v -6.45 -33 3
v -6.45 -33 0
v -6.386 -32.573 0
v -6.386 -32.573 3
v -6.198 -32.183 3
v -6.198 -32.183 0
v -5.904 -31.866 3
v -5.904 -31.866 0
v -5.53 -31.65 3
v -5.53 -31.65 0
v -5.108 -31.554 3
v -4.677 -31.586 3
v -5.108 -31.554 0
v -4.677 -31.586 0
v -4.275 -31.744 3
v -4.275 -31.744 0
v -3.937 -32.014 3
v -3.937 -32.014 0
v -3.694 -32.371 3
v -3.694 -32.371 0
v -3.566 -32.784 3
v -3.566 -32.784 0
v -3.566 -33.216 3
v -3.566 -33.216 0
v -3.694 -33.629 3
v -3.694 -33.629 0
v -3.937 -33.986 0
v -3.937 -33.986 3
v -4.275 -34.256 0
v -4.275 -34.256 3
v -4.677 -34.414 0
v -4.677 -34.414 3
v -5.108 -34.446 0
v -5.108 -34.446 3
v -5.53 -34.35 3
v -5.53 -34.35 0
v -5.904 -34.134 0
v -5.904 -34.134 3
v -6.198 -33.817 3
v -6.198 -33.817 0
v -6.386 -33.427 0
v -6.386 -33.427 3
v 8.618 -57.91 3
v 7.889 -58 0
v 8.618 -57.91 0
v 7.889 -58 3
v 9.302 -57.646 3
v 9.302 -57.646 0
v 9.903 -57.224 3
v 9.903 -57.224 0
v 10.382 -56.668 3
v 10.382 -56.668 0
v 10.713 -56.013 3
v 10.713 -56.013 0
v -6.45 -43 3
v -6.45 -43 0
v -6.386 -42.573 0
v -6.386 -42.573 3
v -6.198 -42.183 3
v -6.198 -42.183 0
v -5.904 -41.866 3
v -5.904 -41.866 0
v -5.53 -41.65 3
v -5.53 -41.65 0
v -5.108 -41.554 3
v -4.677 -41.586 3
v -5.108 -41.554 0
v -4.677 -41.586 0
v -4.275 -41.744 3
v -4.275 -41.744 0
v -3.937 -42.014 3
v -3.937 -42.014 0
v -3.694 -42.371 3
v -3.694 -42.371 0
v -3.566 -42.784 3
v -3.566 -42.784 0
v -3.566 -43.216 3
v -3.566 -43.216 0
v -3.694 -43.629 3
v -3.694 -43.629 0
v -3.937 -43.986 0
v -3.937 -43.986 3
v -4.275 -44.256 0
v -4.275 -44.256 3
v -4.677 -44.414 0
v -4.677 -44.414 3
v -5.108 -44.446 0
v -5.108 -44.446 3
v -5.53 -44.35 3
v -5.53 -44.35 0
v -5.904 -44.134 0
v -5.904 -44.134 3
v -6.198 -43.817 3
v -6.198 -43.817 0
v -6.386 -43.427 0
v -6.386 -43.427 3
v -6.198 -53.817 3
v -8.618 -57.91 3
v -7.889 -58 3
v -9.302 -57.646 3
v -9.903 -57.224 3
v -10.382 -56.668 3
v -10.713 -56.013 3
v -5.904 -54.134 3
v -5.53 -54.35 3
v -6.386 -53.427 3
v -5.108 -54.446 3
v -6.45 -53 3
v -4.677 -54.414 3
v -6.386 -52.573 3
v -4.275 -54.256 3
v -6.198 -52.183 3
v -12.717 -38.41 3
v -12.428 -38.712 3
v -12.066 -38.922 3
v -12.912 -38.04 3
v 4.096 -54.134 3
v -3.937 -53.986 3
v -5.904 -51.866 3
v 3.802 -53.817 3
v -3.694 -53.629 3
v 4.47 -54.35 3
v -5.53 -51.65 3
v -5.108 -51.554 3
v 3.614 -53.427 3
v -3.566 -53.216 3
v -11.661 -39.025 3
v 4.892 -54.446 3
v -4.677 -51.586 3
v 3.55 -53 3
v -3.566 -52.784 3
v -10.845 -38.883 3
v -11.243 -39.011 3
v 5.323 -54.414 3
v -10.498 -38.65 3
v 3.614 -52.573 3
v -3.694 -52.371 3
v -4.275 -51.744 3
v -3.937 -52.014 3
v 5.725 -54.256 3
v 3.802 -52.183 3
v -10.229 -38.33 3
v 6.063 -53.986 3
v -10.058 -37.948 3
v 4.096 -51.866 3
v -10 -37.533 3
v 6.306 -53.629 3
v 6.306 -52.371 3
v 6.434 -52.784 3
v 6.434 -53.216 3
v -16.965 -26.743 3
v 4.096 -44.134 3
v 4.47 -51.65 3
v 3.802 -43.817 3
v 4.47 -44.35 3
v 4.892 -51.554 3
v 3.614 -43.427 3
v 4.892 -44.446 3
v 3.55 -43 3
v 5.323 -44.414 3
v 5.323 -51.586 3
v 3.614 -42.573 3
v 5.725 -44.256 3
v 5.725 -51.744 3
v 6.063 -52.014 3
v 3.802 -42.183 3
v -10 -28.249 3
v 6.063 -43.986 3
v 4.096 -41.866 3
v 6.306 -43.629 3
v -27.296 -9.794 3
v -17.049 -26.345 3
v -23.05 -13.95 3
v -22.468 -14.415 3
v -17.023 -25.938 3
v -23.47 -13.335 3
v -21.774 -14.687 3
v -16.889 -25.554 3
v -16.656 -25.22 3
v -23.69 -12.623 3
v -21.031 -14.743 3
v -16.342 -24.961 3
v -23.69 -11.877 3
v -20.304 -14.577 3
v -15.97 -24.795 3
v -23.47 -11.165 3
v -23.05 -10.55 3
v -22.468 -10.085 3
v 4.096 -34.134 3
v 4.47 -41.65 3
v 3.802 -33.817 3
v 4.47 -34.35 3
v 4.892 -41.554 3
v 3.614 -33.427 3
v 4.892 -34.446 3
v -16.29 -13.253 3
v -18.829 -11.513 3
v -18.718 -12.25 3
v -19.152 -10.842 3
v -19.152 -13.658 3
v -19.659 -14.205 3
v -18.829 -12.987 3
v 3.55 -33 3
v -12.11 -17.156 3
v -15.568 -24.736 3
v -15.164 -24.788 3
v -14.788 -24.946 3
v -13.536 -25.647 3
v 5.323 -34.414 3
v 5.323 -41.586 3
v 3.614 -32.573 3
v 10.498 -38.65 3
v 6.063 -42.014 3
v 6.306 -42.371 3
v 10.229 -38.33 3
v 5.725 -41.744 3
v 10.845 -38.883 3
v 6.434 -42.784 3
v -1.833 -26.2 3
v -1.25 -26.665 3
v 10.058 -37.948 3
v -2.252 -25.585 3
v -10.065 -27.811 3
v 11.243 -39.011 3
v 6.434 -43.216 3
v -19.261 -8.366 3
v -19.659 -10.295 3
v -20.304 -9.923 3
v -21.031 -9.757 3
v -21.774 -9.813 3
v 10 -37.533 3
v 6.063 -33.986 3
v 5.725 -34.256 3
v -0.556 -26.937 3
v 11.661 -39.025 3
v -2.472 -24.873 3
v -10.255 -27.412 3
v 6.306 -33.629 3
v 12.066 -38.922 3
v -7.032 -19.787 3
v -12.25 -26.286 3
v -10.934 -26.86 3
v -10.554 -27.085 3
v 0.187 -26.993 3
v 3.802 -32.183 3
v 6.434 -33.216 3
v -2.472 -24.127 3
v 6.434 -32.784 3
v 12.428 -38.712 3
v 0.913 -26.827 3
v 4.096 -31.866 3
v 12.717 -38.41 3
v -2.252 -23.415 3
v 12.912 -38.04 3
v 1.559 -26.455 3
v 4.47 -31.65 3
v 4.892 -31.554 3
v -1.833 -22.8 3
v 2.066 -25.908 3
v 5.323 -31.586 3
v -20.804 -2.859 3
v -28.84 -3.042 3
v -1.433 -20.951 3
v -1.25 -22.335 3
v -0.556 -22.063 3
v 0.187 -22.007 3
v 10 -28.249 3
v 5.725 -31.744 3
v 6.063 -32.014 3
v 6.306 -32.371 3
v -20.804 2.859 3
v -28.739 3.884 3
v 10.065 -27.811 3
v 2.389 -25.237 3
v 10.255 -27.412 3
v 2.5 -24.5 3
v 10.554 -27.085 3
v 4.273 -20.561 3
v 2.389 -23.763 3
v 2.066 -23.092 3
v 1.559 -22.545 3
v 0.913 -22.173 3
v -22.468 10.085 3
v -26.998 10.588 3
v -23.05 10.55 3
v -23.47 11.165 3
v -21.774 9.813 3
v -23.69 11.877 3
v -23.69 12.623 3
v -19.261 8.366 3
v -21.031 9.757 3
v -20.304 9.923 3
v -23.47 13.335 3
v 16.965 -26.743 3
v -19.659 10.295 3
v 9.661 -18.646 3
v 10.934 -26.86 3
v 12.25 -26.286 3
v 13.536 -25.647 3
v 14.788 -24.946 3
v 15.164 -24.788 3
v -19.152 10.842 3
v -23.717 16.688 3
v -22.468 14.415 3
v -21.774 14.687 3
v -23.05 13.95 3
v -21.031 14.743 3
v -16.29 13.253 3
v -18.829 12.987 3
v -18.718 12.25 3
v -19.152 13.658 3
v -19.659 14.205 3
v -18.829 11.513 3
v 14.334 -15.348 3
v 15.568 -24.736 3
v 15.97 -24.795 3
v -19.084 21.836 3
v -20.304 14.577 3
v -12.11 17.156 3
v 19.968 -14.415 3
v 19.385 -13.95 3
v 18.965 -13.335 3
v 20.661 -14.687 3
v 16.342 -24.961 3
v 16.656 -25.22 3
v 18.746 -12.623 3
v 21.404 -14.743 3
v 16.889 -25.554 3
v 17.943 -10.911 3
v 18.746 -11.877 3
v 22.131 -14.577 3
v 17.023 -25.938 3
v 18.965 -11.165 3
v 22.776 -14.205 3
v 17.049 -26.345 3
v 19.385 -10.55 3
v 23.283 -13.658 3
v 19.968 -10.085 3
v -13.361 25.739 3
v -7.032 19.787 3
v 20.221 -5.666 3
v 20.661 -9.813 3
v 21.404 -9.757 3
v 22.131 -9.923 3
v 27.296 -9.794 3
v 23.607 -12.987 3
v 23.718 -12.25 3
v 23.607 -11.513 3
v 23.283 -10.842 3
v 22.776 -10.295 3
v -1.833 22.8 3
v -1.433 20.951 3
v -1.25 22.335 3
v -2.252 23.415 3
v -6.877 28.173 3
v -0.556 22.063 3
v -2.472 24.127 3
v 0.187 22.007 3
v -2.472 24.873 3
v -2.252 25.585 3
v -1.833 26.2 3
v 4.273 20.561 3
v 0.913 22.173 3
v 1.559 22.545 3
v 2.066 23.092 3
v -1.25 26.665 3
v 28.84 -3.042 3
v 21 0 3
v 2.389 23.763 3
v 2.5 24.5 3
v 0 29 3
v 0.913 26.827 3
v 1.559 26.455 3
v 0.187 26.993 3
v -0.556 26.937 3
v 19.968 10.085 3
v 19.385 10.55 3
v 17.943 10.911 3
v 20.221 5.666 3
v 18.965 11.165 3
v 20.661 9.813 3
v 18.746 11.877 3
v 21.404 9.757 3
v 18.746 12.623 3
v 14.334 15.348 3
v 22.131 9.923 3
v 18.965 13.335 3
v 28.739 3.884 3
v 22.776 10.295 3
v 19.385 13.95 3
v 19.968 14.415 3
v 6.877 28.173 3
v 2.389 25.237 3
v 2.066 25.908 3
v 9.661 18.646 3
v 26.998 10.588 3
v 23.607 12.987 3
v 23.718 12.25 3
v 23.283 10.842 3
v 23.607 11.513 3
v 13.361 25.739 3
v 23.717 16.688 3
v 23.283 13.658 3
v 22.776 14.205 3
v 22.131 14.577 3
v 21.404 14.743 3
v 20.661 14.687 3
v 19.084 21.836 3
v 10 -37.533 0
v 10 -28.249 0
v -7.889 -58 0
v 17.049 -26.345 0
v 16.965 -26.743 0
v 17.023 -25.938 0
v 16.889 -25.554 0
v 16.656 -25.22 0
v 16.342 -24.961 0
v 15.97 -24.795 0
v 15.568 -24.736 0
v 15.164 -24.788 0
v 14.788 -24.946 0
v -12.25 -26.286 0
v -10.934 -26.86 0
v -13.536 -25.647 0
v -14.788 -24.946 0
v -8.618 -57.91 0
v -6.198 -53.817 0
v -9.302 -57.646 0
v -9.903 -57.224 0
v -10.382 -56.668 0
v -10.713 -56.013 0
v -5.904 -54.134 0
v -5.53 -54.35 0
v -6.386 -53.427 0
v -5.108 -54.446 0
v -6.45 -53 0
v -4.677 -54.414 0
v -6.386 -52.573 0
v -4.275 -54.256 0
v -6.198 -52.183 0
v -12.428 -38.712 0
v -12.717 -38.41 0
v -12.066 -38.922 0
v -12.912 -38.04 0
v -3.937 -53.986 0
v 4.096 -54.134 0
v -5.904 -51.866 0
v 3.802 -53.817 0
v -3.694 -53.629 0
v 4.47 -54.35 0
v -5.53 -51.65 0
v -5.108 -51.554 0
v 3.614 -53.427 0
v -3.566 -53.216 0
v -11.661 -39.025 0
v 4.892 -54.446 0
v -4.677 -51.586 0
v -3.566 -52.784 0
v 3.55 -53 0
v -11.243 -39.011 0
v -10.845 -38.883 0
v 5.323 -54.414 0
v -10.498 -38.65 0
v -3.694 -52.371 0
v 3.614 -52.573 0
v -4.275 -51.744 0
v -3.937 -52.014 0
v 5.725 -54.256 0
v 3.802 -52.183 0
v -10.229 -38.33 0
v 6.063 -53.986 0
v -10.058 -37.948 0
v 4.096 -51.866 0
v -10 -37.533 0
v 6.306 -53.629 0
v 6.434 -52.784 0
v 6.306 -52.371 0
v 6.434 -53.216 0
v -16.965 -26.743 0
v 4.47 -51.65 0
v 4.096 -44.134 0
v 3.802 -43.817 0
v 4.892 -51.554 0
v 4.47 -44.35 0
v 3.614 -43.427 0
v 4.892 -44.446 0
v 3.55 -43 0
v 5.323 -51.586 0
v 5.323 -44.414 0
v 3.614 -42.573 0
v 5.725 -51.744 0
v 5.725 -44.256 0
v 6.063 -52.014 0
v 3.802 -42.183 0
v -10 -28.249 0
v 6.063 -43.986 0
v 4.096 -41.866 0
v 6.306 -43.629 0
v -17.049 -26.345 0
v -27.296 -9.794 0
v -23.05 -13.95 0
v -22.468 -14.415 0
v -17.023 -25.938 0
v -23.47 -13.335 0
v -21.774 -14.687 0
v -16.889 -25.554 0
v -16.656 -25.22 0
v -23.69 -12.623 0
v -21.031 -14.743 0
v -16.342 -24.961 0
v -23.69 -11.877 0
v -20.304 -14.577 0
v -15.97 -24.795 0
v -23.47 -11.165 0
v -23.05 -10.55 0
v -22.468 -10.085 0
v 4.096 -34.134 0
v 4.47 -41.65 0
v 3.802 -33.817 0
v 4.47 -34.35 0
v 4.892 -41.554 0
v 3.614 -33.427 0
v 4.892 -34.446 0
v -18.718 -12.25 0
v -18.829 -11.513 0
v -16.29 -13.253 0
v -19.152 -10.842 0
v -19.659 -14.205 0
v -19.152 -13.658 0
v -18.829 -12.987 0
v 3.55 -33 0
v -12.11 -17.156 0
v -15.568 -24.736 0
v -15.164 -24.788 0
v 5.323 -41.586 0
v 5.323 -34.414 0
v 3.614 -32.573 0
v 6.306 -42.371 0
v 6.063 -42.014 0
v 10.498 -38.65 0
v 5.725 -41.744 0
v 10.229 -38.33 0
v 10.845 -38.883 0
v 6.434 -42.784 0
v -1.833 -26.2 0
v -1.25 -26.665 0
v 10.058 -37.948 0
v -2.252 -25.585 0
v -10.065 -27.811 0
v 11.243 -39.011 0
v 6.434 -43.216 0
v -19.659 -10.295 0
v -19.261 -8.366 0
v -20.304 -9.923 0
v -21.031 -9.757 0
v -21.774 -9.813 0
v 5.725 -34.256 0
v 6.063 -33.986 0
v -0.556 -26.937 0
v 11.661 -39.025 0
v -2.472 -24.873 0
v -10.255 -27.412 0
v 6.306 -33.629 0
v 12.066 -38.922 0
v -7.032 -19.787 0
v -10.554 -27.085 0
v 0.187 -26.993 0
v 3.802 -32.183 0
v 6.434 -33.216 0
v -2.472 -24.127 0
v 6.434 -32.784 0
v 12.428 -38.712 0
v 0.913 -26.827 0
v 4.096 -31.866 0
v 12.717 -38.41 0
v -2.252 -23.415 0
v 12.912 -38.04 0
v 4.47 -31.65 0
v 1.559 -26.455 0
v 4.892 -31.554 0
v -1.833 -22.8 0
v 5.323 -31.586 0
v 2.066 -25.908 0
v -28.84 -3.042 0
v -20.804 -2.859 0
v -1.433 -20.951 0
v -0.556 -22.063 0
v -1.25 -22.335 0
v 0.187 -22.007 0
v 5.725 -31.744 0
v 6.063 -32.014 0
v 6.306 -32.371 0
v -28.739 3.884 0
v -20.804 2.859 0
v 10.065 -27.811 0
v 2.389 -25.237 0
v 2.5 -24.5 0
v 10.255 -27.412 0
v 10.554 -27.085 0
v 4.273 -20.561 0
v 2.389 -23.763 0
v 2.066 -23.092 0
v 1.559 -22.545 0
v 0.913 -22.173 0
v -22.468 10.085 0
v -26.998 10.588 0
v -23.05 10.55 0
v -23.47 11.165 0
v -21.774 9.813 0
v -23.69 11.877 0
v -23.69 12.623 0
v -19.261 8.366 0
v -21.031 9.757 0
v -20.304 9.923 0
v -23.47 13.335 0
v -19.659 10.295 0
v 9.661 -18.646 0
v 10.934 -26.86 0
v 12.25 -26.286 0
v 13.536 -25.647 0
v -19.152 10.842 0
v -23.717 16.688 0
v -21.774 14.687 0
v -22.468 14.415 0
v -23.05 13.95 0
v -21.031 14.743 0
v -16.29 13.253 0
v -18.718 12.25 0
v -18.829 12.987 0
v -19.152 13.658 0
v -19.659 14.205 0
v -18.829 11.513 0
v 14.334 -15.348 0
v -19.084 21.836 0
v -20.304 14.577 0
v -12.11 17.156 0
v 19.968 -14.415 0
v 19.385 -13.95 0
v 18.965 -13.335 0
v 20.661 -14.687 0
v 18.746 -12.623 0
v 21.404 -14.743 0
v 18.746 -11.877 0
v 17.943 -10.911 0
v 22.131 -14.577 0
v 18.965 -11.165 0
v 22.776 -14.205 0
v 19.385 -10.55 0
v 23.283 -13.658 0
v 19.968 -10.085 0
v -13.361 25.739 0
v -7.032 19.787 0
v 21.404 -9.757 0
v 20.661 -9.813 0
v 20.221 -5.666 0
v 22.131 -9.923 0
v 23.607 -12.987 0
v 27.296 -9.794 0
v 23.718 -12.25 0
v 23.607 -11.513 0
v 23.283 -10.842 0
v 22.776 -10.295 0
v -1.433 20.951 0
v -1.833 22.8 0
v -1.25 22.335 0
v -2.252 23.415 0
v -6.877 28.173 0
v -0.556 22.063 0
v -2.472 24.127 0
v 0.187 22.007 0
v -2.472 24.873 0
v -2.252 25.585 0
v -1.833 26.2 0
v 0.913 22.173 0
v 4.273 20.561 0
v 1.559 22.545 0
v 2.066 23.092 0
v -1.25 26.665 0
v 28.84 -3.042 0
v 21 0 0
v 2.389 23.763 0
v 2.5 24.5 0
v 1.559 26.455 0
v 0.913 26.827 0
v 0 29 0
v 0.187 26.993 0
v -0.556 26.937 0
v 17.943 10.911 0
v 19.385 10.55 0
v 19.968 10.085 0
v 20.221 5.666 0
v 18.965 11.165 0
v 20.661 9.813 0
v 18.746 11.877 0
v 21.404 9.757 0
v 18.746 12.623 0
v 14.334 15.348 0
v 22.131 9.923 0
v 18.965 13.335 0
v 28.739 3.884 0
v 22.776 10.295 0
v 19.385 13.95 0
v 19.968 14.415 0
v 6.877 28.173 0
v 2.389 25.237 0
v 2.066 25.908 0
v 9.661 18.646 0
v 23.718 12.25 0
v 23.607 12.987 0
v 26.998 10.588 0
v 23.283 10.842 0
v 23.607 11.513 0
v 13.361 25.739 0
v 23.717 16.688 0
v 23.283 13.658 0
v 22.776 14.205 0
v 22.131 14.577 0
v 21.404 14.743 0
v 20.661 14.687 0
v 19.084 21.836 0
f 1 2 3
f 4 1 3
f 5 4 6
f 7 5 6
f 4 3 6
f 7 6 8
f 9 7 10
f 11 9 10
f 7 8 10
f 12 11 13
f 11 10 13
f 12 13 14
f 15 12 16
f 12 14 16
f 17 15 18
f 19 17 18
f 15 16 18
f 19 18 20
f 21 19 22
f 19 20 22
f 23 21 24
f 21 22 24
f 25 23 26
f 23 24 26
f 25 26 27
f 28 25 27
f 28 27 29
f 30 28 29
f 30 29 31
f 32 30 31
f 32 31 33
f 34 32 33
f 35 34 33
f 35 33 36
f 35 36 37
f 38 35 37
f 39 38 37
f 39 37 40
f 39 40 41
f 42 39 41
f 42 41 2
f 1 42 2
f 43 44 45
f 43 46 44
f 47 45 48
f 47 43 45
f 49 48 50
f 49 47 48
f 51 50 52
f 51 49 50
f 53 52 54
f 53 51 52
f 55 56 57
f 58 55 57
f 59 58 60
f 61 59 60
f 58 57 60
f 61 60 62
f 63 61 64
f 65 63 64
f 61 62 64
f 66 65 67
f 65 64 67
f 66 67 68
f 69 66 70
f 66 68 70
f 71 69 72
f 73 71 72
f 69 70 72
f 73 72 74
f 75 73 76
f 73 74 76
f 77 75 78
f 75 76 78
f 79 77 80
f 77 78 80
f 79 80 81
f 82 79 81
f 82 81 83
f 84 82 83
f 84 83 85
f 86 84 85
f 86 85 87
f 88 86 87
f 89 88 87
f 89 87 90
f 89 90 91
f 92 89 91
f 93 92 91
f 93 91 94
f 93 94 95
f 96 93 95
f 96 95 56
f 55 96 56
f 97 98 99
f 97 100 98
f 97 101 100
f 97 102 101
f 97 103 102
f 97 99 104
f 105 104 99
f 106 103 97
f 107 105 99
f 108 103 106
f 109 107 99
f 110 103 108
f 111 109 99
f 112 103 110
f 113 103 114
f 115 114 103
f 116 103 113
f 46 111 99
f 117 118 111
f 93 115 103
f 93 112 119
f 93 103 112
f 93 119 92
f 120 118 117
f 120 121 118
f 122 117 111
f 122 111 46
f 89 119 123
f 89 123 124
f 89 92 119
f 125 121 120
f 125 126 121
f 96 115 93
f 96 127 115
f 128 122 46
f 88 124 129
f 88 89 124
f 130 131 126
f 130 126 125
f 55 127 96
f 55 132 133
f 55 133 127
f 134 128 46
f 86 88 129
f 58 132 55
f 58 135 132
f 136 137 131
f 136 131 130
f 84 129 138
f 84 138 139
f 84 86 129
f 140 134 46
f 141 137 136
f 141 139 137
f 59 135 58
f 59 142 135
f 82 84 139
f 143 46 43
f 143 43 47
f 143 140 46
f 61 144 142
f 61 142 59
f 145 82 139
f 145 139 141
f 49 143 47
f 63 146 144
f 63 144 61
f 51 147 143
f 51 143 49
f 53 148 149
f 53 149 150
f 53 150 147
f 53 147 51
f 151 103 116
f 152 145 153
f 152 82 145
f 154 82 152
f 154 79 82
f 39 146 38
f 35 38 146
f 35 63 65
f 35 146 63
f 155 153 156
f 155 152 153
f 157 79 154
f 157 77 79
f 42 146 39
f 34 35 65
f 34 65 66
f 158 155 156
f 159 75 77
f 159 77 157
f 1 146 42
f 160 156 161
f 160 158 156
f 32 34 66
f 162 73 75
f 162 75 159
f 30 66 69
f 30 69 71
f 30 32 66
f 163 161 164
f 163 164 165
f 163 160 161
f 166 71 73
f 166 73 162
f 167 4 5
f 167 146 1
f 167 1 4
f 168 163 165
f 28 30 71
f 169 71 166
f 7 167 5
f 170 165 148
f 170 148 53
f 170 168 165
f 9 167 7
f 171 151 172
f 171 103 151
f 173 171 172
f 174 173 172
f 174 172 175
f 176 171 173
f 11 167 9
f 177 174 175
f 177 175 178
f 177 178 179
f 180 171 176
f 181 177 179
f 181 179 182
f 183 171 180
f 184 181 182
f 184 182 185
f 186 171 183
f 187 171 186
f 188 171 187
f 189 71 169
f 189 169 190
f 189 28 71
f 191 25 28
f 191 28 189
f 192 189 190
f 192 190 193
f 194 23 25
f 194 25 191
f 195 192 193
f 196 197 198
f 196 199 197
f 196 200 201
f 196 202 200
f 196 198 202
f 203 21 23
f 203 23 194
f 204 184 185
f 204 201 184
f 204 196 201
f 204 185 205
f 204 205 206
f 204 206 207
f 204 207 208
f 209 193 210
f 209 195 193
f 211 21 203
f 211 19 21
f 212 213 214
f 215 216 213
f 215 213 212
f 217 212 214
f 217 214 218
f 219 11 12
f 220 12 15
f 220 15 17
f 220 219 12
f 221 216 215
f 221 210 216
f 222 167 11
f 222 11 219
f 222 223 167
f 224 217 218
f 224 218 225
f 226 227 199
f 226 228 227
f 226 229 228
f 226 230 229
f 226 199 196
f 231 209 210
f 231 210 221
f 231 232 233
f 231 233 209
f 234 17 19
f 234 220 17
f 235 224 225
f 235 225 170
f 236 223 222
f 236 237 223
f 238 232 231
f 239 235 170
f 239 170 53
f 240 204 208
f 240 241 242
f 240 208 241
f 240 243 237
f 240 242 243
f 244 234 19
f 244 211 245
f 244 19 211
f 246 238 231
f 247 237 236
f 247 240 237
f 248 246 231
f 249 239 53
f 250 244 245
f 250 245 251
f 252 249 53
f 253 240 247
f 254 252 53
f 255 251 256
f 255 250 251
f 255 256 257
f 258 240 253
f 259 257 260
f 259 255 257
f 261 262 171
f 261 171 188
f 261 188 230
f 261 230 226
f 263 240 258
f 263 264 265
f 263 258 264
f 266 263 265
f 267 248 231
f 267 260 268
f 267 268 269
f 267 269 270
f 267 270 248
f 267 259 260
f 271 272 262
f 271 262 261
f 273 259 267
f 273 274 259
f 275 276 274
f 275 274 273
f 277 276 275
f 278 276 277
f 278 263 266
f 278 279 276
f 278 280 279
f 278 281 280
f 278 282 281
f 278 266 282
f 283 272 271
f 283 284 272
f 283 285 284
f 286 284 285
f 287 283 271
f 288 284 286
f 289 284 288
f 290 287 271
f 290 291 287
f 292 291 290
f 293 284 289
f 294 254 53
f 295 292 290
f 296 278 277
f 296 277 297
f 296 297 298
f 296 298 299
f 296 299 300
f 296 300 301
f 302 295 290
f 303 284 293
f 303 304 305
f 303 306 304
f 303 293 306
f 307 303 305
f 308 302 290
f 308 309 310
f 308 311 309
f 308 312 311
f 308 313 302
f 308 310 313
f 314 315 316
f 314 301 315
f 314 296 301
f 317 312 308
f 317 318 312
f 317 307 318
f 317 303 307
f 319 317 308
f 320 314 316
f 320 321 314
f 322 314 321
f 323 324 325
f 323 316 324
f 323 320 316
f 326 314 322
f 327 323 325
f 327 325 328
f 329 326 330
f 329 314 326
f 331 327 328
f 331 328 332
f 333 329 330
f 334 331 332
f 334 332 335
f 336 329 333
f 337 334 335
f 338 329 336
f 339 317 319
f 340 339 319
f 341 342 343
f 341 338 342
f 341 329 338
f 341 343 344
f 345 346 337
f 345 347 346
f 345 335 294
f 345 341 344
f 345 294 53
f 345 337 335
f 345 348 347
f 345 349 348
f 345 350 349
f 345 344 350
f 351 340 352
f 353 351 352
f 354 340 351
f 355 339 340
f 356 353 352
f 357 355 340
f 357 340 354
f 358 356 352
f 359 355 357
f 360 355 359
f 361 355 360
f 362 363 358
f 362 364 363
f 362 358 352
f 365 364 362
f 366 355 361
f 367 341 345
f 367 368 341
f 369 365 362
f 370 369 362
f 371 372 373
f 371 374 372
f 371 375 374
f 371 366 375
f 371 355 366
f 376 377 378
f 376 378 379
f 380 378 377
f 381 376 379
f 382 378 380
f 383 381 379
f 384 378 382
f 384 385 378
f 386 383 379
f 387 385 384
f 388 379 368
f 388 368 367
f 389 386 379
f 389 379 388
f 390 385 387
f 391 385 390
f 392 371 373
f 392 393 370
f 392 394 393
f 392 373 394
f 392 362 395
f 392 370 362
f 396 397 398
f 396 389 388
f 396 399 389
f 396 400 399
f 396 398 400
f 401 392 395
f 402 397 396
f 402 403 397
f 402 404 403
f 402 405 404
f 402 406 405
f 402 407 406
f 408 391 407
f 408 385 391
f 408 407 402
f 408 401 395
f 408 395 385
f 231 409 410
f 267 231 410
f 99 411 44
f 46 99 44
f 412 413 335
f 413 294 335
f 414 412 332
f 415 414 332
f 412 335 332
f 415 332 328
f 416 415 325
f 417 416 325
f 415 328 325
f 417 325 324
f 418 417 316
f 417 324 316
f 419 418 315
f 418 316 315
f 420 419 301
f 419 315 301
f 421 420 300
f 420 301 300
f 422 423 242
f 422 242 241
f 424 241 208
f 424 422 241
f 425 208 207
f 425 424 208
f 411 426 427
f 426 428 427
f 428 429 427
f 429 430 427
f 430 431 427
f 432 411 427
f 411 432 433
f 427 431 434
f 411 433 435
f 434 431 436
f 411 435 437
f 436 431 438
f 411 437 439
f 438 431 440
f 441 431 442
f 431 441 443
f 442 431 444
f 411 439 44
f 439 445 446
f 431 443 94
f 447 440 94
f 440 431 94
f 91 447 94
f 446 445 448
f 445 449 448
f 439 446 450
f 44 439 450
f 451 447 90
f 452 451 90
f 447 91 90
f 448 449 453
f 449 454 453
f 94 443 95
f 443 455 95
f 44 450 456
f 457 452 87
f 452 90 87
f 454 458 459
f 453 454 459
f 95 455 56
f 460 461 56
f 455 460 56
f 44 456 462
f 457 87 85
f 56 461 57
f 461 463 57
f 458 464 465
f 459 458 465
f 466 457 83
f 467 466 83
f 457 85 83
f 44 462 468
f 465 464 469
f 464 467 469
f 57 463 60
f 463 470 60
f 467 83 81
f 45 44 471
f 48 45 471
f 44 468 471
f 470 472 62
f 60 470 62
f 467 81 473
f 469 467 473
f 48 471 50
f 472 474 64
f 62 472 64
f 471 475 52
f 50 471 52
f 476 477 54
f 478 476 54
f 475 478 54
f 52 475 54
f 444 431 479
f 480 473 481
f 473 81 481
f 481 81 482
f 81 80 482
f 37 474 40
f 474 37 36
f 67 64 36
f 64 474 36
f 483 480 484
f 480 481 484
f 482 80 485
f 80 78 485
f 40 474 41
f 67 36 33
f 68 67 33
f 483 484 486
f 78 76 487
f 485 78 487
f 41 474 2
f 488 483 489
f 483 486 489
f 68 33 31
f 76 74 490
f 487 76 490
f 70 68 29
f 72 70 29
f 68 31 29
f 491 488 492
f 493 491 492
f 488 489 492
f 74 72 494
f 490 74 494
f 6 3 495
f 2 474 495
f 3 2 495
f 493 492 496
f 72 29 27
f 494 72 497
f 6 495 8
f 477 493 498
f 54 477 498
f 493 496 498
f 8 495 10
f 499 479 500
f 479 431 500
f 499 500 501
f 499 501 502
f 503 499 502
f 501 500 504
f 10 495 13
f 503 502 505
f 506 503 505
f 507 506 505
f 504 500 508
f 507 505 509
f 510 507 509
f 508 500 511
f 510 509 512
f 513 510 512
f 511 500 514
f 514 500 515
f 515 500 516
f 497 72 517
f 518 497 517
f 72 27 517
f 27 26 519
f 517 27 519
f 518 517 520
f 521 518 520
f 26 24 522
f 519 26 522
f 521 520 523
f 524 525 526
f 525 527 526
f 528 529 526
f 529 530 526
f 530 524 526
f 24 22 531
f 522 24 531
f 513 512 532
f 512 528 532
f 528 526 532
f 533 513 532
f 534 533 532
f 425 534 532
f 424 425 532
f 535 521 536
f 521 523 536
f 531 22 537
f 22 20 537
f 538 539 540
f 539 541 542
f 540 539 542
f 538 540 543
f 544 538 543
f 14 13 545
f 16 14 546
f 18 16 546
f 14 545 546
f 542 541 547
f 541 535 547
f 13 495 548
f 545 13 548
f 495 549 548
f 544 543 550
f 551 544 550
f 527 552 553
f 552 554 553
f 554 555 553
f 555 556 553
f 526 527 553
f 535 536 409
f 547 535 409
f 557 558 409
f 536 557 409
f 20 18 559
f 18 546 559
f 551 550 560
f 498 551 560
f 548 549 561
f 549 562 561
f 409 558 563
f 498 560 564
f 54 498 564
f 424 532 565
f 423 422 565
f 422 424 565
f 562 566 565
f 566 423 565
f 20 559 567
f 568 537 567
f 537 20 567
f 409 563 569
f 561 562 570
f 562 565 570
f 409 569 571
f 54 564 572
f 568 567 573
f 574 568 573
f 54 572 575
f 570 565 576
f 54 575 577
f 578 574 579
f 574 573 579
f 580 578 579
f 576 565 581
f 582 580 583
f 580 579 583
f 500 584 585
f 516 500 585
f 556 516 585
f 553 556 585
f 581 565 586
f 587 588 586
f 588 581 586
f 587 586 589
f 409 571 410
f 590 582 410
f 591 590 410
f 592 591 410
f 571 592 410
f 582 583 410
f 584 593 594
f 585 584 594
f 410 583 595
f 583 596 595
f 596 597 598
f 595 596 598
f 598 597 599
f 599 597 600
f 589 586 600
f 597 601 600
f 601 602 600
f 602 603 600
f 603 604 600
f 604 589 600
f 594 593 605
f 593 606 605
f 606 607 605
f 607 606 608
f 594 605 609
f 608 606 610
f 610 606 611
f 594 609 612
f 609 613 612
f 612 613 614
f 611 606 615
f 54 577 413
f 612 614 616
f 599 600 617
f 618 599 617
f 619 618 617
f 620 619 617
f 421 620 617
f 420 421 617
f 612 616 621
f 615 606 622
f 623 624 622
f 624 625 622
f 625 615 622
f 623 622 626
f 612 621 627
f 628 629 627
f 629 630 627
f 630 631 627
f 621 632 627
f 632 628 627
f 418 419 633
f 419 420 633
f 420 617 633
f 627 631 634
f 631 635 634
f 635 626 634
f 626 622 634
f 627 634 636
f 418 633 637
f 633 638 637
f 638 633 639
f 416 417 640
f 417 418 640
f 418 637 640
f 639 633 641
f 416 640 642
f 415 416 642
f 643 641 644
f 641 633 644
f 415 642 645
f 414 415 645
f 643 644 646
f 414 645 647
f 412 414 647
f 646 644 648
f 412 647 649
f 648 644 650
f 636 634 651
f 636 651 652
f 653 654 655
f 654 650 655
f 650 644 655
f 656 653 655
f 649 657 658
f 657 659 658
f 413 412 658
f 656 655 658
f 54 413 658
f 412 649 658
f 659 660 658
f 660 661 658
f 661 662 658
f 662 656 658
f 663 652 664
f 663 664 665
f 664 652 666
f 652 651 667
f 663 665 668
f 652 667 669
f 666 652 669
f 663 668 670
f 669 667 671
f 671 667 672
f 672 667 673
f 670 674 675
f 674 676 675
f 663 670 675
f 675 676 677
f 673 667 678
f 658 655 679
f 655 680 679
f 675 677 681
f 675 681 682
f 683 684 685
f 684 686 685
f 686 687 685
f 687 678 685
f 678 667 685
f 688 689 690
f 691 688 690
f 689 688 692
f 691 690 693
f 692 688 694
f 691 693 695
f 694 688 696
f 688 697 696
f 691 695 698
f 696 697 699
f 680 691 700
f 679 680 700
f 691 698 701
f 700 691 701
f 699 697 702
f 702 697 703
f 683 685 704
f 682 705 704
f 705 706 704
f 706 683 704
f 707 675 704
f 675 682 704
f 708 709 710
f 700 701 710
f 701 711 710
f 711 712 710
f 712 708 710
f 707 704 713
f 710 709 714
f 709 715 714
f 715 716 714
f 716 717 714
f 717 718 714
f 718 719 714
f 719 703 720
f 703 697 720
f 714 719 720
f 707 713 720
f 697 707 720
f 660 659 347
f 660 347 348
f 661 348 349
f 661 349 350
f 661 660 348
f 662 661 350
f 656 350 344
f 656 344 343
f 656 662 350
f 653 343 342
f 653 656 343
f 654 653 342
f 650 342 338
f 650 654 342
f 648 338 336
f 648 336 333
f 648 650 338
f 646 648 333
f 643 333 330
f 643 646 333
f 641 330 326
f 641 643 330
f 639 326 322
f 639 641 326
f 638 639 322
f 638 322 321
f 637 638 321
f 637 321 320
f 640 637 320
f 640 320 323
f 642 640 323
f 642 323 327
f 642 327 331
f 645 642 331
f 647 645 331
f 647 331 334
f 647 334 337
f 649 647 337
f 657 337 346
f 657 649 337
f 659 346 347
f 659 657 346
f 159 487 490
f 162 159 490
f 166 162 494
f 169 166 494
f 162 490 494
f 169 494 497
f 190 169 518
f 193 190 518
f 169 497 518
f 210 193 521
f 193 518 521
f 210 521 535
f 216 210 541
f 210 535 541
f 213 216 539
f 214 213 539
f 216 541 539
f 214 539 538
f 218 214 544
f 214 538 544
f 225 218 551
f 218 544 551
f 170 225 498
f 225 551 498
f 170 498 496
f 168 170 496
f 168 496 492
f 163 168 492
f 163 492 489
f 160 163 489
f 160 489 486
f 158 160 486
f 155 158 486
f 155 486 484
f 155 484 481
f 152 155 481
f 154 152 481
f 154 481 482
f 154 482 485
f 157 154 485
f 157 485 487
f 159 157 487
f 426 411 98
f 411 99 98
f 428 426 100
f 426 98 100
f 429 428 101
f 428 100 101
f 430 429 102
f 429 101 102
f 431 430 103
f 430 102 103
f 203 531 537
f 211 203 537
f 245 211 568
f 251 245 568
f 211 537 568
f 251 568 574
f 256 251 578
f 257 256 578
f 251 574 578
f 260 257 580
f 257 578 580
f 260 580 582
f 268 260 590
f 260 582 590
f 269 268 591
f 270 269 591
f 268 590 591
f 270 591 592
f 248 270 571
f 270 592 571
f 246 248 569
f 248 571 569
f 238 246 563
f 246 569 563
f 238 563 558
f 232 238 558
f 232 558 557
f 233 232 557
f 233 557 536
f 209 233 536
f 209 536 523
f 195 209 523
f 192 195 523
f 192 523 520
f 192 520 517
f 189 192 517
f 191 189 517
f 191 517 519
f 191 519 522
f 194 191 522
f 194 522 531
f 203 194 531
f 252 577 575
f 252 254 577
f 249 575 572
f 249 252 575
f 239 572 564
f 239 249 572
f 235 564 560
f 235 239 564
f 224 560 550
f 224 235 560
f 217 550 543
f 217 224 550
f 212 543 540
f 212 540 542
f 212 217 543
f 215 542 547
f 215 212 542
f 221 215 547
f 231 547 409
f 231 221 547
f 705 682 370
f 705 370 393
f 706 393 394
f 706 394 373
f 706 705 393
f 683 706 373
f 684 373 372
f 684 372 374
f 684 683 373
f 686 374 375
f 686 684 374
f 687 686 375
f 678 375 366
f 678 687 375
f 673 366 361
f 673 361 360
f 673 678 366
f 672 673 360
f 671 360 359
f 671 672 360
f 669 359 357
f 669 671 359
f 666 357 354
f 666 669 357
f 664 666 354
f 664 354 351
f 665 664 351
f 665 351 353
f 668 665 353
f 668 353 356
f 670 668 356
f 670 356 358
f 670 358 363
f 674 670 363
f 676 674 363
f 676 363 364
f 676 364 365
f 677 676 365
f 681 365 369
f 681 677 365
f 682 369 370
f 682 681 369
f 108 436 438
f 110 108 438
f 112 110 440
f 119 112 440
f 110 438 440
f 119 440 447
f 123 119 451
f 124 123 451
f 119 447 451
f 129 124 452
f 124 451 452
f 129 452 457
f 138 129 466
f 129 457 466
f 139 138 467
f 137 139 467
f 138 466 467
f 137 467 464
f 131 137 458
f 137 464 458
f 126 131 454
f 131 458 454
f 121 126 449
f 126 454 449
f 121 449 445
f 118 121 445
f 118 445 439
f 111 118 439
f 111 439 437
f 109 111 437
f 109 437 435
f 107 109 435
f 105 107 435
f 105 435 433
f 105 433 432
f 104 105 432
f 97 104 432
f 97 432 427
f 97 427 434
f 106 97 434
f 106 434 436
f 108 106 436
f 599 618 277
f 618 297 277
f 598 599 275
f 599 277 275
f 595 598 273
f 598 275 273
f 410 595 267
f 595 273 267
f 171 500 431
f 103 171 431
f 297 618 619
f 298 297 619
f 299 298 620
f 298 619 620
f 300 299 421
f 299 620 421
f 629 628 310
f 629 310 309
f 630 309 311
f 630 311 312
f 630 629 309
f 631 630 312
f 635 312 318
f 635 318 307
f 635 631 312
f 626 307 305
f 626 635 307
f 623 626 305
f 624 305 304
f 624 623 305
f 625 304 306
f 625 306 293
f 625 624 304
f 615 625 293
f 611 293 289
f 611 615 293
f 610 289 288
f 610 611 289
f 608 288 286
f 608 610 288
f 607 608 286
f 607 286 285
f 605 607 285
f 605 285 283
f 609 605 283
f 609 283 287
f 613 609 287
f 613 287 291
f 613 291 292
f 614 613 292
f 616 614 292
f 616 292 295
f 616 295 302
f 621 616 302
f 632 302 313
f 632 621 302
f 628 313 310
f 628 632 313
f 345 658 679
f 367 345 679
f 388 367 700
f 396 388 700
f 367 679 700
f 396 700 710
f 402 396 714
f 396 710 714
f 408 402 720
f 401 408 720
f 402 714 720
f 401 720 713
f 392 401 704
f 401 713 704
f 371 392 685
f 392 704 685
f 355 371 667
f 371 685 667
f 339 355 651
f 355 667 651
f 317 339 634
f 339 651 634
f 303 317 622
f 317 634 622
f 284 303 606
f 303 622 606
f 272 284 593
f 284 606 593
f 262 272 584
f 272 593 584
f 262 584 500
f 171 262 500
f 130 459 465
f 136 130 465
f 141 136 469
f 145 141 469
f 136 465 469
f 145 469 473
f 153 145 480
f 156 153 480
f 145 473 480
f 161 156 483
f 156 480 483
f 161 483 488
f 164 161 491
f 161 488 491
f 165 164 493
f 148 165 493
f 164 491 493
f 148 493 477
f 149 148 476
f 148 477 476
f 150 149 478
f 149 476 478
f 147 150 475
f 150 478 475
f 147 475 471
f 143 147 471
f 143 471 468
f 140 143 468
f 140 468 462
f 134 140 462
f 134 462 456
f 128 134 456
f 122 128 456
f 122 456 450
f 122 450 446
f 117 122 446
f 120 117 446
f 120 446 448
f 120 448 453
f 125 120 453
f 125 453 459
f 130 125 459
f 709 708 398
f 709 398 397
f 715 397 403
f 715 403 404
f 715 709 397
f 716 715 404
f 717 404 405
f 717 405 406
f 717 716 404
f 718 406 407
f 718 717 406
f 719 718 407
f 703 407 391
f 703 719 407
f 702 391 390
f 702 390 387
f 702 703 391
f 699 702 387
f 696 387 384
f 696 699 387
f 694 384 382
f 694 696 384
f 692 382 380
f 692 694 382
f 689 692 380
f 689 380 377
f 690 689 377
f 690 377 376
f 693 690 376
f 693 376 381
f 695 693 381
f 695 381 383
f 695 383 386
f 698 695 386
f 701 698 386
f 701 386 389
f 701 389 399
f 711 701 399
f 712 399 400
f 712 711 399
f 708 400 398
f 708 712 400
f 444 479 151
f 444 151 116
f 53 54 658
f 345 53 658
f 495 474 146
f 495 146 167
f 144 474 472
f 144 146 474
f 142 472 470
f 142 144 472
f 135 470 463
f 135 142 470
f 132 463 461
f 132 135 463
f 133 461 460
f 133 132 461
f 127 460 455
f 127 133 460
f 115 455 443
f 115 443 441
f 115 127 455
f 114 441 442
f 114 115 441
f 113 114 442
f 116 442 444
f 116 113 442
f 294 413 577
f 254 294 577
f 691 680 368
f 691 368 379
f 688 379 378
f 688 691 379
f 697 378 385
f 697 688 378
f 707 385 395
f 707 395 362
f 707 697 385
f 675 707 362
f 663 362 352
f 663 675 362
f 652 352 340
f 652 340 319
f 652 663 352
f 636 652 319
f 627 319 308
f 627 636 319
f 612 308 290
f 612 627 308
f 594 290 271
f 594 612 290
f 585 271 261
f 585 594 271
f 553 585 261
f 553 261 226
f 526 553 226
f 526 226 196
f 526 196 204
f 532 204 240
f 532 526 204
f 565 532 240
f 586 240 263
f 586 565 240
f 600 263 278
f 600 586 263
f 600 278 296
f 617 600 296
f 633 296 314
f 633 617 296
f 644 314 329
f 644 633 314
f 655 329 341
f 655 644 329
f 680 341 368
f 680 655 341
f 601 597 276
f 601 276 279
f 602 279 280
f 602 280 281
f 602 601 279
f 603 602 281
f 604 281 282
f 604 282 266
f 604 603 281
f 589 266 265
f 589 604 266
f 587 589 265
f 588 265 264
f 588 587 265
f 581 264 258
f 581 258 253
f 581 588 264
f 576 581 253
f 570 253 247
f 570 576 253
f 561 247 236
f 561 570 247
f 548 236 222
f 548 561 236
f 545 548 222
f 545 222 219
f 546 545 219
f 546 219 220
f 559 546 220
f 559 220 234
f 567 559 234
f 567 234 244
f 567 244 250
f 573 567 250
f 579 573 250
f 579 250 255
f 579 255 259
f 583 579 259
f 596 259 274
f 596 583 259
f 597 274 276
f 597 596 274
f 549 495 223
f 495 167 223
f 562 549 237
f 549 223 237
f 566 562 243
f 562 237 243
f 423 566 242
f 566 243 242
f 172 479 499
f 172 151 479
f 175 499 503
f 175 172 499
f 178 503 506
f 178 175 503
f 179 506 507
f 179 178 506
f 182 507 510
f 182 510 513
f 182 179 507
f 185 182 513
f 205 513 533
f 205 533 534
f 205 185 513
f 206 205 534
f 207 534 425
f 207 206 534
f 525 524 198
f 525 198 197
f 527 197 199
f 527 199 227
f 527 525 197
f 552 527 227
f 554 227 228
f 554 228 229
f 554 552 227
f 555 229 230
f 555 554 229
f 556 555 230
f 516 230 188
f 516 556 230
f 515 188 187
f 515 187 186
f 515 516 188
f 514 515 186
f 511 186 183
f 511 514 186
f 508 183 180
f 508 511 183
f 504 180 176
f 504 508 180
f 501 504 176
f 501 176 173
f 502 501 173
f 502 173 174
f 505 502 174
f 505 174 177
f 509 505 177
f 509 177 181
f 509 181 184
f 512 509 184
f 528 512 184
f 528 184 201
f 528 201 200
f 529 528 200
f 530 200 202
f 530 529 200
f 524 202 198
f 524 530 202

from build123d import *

# Parameters (mm, degrees)
SKETCH_2_R          = 21
SKETCH_2_R_2        = 2.5
EXTRUDE_1_DEPTH     = 3
FILLET_1_R          = 1.5
SKETCH_3_R          = 1.45
CUT_EXTRUDE_1_DEPTH = 5
FILLET_2_R          = 3


with BuildPart() as part:
    # Sketch 2 → Extrude 1 (new body)
    with BuildSketch(Plane.XY):
        with BuildLine():
            Line((-10, -58), (10, -58))
            Line((10, -58), (27.296195268, -9.793759437))
            ThreePointArc((27.296195268, -9.793759437), (0, 29), (-27.296195268, -9.793759437))
            Line((-27.296195268, -9.793759437), (-10, -58))
        make_face()
        Circle(SKETCH_2_R, mode=Mode.SUBTRACT)
        with Locations((0, 24.5)):
            Circle(SKETCH_2_R_2, mode=Mode.SUBTRACT)
        with Locations((21.217622393, 12.25)):
            Circle(SKETCH_2_R_2, mode=Mode.SUBTRACT)
        with Locations((21.217622393, -12.25)):
            Circle(SKETCH_2_R_2, mode=Mode.SUBTRACT)
        with Locations((0, -24.5)):
            Circle(SKETCH_2_R_2, mode=Mode.SUBTRACT)
        with Locations((-21.217622393, -12.25)):
            Circle(SKETCH_2_R_2, mode=Mode.SUBTRACT)
        with Locations((-21.217622393, 12.25)):
            Circle(SKETCH_2_R_2, mode=Mode.SUBTRACT)
        with BuildLine():
            Line((-10, -46.155722963), (-10, -27.221315178))
            ThreePointArc((-10, -27.221315178), (-14.496314654, -25.116864085), (-18.567813862, -22.276361651))
            Line((-18.567813862, -22.276361651), (-10, -46.155722963))
        make_face(mode=Mode.SUBTRACT)
        with BuildLine():
            Line((10, -46.155722963), (10, -27.221315178))
            ThreePointArc((10, -27.221315178), (14.496314654, -25.116864085), (18.567813862, -22.276361651))
            Line((18.567813862, -22.276361651), (10, -46.155722963))
        make_face(mode=Mode.SUBTRACT)
    extrude(amount=EXTRUDE_1_DEPTH)

    # Fillet 1
    fillet_1_edges = [part.edges().sort_by_distance(p)[0] for p in [
        (-18.567813862, -22.276361651, 1.5),
        (-10, -46.155722963, 1.5),
        (-10, -27.221315178, 1.5),
        (10, -46.155722963, 1.5),
        (18.567813862, -22.276361651, 1.5),
        (10, -27.221315178, 1.5),
    ]]
    fillet(fillet_1_edges, radius=FILLET_1_R)

    # Sketch 3 → Cut-Extrude 1 (cut)
    with BuildSketch(Plane(origin=(0, 0, 0), x_dir=(-1, 0, 0), z_dir=(0, 0, -1))):
        with Locations((-5, -33)):
            Circle(SKETCH_3_R)
        with Locations((-5, -43)):
            Circle(SKETCH_3_R)
        with Locations((-5, -53)):
            Circle(SKETCH_3_R)
        with Locations((5, -53)):
            Circle(SKETCH_3_R)
        with Locations((5, -43)):
            Circle(SKETCH_3_R)
        with Locations((5, -33)):
            Circle(SKETCH_3_R)
    extrude(amount=-CUT_EXTRUDE_1_DEPTH, mode=Mode.SUBTRACT)

    # Fillet 2
    fillet_2_edges = [part.edges().sort_by_distance(p)[0] for p in [
        (10, -58, 1.5),
        (-10, -58, 1.5),
    ]]
    fillet(fillet_2_edges, radius=FILLET_2_R)


solid = part.part
